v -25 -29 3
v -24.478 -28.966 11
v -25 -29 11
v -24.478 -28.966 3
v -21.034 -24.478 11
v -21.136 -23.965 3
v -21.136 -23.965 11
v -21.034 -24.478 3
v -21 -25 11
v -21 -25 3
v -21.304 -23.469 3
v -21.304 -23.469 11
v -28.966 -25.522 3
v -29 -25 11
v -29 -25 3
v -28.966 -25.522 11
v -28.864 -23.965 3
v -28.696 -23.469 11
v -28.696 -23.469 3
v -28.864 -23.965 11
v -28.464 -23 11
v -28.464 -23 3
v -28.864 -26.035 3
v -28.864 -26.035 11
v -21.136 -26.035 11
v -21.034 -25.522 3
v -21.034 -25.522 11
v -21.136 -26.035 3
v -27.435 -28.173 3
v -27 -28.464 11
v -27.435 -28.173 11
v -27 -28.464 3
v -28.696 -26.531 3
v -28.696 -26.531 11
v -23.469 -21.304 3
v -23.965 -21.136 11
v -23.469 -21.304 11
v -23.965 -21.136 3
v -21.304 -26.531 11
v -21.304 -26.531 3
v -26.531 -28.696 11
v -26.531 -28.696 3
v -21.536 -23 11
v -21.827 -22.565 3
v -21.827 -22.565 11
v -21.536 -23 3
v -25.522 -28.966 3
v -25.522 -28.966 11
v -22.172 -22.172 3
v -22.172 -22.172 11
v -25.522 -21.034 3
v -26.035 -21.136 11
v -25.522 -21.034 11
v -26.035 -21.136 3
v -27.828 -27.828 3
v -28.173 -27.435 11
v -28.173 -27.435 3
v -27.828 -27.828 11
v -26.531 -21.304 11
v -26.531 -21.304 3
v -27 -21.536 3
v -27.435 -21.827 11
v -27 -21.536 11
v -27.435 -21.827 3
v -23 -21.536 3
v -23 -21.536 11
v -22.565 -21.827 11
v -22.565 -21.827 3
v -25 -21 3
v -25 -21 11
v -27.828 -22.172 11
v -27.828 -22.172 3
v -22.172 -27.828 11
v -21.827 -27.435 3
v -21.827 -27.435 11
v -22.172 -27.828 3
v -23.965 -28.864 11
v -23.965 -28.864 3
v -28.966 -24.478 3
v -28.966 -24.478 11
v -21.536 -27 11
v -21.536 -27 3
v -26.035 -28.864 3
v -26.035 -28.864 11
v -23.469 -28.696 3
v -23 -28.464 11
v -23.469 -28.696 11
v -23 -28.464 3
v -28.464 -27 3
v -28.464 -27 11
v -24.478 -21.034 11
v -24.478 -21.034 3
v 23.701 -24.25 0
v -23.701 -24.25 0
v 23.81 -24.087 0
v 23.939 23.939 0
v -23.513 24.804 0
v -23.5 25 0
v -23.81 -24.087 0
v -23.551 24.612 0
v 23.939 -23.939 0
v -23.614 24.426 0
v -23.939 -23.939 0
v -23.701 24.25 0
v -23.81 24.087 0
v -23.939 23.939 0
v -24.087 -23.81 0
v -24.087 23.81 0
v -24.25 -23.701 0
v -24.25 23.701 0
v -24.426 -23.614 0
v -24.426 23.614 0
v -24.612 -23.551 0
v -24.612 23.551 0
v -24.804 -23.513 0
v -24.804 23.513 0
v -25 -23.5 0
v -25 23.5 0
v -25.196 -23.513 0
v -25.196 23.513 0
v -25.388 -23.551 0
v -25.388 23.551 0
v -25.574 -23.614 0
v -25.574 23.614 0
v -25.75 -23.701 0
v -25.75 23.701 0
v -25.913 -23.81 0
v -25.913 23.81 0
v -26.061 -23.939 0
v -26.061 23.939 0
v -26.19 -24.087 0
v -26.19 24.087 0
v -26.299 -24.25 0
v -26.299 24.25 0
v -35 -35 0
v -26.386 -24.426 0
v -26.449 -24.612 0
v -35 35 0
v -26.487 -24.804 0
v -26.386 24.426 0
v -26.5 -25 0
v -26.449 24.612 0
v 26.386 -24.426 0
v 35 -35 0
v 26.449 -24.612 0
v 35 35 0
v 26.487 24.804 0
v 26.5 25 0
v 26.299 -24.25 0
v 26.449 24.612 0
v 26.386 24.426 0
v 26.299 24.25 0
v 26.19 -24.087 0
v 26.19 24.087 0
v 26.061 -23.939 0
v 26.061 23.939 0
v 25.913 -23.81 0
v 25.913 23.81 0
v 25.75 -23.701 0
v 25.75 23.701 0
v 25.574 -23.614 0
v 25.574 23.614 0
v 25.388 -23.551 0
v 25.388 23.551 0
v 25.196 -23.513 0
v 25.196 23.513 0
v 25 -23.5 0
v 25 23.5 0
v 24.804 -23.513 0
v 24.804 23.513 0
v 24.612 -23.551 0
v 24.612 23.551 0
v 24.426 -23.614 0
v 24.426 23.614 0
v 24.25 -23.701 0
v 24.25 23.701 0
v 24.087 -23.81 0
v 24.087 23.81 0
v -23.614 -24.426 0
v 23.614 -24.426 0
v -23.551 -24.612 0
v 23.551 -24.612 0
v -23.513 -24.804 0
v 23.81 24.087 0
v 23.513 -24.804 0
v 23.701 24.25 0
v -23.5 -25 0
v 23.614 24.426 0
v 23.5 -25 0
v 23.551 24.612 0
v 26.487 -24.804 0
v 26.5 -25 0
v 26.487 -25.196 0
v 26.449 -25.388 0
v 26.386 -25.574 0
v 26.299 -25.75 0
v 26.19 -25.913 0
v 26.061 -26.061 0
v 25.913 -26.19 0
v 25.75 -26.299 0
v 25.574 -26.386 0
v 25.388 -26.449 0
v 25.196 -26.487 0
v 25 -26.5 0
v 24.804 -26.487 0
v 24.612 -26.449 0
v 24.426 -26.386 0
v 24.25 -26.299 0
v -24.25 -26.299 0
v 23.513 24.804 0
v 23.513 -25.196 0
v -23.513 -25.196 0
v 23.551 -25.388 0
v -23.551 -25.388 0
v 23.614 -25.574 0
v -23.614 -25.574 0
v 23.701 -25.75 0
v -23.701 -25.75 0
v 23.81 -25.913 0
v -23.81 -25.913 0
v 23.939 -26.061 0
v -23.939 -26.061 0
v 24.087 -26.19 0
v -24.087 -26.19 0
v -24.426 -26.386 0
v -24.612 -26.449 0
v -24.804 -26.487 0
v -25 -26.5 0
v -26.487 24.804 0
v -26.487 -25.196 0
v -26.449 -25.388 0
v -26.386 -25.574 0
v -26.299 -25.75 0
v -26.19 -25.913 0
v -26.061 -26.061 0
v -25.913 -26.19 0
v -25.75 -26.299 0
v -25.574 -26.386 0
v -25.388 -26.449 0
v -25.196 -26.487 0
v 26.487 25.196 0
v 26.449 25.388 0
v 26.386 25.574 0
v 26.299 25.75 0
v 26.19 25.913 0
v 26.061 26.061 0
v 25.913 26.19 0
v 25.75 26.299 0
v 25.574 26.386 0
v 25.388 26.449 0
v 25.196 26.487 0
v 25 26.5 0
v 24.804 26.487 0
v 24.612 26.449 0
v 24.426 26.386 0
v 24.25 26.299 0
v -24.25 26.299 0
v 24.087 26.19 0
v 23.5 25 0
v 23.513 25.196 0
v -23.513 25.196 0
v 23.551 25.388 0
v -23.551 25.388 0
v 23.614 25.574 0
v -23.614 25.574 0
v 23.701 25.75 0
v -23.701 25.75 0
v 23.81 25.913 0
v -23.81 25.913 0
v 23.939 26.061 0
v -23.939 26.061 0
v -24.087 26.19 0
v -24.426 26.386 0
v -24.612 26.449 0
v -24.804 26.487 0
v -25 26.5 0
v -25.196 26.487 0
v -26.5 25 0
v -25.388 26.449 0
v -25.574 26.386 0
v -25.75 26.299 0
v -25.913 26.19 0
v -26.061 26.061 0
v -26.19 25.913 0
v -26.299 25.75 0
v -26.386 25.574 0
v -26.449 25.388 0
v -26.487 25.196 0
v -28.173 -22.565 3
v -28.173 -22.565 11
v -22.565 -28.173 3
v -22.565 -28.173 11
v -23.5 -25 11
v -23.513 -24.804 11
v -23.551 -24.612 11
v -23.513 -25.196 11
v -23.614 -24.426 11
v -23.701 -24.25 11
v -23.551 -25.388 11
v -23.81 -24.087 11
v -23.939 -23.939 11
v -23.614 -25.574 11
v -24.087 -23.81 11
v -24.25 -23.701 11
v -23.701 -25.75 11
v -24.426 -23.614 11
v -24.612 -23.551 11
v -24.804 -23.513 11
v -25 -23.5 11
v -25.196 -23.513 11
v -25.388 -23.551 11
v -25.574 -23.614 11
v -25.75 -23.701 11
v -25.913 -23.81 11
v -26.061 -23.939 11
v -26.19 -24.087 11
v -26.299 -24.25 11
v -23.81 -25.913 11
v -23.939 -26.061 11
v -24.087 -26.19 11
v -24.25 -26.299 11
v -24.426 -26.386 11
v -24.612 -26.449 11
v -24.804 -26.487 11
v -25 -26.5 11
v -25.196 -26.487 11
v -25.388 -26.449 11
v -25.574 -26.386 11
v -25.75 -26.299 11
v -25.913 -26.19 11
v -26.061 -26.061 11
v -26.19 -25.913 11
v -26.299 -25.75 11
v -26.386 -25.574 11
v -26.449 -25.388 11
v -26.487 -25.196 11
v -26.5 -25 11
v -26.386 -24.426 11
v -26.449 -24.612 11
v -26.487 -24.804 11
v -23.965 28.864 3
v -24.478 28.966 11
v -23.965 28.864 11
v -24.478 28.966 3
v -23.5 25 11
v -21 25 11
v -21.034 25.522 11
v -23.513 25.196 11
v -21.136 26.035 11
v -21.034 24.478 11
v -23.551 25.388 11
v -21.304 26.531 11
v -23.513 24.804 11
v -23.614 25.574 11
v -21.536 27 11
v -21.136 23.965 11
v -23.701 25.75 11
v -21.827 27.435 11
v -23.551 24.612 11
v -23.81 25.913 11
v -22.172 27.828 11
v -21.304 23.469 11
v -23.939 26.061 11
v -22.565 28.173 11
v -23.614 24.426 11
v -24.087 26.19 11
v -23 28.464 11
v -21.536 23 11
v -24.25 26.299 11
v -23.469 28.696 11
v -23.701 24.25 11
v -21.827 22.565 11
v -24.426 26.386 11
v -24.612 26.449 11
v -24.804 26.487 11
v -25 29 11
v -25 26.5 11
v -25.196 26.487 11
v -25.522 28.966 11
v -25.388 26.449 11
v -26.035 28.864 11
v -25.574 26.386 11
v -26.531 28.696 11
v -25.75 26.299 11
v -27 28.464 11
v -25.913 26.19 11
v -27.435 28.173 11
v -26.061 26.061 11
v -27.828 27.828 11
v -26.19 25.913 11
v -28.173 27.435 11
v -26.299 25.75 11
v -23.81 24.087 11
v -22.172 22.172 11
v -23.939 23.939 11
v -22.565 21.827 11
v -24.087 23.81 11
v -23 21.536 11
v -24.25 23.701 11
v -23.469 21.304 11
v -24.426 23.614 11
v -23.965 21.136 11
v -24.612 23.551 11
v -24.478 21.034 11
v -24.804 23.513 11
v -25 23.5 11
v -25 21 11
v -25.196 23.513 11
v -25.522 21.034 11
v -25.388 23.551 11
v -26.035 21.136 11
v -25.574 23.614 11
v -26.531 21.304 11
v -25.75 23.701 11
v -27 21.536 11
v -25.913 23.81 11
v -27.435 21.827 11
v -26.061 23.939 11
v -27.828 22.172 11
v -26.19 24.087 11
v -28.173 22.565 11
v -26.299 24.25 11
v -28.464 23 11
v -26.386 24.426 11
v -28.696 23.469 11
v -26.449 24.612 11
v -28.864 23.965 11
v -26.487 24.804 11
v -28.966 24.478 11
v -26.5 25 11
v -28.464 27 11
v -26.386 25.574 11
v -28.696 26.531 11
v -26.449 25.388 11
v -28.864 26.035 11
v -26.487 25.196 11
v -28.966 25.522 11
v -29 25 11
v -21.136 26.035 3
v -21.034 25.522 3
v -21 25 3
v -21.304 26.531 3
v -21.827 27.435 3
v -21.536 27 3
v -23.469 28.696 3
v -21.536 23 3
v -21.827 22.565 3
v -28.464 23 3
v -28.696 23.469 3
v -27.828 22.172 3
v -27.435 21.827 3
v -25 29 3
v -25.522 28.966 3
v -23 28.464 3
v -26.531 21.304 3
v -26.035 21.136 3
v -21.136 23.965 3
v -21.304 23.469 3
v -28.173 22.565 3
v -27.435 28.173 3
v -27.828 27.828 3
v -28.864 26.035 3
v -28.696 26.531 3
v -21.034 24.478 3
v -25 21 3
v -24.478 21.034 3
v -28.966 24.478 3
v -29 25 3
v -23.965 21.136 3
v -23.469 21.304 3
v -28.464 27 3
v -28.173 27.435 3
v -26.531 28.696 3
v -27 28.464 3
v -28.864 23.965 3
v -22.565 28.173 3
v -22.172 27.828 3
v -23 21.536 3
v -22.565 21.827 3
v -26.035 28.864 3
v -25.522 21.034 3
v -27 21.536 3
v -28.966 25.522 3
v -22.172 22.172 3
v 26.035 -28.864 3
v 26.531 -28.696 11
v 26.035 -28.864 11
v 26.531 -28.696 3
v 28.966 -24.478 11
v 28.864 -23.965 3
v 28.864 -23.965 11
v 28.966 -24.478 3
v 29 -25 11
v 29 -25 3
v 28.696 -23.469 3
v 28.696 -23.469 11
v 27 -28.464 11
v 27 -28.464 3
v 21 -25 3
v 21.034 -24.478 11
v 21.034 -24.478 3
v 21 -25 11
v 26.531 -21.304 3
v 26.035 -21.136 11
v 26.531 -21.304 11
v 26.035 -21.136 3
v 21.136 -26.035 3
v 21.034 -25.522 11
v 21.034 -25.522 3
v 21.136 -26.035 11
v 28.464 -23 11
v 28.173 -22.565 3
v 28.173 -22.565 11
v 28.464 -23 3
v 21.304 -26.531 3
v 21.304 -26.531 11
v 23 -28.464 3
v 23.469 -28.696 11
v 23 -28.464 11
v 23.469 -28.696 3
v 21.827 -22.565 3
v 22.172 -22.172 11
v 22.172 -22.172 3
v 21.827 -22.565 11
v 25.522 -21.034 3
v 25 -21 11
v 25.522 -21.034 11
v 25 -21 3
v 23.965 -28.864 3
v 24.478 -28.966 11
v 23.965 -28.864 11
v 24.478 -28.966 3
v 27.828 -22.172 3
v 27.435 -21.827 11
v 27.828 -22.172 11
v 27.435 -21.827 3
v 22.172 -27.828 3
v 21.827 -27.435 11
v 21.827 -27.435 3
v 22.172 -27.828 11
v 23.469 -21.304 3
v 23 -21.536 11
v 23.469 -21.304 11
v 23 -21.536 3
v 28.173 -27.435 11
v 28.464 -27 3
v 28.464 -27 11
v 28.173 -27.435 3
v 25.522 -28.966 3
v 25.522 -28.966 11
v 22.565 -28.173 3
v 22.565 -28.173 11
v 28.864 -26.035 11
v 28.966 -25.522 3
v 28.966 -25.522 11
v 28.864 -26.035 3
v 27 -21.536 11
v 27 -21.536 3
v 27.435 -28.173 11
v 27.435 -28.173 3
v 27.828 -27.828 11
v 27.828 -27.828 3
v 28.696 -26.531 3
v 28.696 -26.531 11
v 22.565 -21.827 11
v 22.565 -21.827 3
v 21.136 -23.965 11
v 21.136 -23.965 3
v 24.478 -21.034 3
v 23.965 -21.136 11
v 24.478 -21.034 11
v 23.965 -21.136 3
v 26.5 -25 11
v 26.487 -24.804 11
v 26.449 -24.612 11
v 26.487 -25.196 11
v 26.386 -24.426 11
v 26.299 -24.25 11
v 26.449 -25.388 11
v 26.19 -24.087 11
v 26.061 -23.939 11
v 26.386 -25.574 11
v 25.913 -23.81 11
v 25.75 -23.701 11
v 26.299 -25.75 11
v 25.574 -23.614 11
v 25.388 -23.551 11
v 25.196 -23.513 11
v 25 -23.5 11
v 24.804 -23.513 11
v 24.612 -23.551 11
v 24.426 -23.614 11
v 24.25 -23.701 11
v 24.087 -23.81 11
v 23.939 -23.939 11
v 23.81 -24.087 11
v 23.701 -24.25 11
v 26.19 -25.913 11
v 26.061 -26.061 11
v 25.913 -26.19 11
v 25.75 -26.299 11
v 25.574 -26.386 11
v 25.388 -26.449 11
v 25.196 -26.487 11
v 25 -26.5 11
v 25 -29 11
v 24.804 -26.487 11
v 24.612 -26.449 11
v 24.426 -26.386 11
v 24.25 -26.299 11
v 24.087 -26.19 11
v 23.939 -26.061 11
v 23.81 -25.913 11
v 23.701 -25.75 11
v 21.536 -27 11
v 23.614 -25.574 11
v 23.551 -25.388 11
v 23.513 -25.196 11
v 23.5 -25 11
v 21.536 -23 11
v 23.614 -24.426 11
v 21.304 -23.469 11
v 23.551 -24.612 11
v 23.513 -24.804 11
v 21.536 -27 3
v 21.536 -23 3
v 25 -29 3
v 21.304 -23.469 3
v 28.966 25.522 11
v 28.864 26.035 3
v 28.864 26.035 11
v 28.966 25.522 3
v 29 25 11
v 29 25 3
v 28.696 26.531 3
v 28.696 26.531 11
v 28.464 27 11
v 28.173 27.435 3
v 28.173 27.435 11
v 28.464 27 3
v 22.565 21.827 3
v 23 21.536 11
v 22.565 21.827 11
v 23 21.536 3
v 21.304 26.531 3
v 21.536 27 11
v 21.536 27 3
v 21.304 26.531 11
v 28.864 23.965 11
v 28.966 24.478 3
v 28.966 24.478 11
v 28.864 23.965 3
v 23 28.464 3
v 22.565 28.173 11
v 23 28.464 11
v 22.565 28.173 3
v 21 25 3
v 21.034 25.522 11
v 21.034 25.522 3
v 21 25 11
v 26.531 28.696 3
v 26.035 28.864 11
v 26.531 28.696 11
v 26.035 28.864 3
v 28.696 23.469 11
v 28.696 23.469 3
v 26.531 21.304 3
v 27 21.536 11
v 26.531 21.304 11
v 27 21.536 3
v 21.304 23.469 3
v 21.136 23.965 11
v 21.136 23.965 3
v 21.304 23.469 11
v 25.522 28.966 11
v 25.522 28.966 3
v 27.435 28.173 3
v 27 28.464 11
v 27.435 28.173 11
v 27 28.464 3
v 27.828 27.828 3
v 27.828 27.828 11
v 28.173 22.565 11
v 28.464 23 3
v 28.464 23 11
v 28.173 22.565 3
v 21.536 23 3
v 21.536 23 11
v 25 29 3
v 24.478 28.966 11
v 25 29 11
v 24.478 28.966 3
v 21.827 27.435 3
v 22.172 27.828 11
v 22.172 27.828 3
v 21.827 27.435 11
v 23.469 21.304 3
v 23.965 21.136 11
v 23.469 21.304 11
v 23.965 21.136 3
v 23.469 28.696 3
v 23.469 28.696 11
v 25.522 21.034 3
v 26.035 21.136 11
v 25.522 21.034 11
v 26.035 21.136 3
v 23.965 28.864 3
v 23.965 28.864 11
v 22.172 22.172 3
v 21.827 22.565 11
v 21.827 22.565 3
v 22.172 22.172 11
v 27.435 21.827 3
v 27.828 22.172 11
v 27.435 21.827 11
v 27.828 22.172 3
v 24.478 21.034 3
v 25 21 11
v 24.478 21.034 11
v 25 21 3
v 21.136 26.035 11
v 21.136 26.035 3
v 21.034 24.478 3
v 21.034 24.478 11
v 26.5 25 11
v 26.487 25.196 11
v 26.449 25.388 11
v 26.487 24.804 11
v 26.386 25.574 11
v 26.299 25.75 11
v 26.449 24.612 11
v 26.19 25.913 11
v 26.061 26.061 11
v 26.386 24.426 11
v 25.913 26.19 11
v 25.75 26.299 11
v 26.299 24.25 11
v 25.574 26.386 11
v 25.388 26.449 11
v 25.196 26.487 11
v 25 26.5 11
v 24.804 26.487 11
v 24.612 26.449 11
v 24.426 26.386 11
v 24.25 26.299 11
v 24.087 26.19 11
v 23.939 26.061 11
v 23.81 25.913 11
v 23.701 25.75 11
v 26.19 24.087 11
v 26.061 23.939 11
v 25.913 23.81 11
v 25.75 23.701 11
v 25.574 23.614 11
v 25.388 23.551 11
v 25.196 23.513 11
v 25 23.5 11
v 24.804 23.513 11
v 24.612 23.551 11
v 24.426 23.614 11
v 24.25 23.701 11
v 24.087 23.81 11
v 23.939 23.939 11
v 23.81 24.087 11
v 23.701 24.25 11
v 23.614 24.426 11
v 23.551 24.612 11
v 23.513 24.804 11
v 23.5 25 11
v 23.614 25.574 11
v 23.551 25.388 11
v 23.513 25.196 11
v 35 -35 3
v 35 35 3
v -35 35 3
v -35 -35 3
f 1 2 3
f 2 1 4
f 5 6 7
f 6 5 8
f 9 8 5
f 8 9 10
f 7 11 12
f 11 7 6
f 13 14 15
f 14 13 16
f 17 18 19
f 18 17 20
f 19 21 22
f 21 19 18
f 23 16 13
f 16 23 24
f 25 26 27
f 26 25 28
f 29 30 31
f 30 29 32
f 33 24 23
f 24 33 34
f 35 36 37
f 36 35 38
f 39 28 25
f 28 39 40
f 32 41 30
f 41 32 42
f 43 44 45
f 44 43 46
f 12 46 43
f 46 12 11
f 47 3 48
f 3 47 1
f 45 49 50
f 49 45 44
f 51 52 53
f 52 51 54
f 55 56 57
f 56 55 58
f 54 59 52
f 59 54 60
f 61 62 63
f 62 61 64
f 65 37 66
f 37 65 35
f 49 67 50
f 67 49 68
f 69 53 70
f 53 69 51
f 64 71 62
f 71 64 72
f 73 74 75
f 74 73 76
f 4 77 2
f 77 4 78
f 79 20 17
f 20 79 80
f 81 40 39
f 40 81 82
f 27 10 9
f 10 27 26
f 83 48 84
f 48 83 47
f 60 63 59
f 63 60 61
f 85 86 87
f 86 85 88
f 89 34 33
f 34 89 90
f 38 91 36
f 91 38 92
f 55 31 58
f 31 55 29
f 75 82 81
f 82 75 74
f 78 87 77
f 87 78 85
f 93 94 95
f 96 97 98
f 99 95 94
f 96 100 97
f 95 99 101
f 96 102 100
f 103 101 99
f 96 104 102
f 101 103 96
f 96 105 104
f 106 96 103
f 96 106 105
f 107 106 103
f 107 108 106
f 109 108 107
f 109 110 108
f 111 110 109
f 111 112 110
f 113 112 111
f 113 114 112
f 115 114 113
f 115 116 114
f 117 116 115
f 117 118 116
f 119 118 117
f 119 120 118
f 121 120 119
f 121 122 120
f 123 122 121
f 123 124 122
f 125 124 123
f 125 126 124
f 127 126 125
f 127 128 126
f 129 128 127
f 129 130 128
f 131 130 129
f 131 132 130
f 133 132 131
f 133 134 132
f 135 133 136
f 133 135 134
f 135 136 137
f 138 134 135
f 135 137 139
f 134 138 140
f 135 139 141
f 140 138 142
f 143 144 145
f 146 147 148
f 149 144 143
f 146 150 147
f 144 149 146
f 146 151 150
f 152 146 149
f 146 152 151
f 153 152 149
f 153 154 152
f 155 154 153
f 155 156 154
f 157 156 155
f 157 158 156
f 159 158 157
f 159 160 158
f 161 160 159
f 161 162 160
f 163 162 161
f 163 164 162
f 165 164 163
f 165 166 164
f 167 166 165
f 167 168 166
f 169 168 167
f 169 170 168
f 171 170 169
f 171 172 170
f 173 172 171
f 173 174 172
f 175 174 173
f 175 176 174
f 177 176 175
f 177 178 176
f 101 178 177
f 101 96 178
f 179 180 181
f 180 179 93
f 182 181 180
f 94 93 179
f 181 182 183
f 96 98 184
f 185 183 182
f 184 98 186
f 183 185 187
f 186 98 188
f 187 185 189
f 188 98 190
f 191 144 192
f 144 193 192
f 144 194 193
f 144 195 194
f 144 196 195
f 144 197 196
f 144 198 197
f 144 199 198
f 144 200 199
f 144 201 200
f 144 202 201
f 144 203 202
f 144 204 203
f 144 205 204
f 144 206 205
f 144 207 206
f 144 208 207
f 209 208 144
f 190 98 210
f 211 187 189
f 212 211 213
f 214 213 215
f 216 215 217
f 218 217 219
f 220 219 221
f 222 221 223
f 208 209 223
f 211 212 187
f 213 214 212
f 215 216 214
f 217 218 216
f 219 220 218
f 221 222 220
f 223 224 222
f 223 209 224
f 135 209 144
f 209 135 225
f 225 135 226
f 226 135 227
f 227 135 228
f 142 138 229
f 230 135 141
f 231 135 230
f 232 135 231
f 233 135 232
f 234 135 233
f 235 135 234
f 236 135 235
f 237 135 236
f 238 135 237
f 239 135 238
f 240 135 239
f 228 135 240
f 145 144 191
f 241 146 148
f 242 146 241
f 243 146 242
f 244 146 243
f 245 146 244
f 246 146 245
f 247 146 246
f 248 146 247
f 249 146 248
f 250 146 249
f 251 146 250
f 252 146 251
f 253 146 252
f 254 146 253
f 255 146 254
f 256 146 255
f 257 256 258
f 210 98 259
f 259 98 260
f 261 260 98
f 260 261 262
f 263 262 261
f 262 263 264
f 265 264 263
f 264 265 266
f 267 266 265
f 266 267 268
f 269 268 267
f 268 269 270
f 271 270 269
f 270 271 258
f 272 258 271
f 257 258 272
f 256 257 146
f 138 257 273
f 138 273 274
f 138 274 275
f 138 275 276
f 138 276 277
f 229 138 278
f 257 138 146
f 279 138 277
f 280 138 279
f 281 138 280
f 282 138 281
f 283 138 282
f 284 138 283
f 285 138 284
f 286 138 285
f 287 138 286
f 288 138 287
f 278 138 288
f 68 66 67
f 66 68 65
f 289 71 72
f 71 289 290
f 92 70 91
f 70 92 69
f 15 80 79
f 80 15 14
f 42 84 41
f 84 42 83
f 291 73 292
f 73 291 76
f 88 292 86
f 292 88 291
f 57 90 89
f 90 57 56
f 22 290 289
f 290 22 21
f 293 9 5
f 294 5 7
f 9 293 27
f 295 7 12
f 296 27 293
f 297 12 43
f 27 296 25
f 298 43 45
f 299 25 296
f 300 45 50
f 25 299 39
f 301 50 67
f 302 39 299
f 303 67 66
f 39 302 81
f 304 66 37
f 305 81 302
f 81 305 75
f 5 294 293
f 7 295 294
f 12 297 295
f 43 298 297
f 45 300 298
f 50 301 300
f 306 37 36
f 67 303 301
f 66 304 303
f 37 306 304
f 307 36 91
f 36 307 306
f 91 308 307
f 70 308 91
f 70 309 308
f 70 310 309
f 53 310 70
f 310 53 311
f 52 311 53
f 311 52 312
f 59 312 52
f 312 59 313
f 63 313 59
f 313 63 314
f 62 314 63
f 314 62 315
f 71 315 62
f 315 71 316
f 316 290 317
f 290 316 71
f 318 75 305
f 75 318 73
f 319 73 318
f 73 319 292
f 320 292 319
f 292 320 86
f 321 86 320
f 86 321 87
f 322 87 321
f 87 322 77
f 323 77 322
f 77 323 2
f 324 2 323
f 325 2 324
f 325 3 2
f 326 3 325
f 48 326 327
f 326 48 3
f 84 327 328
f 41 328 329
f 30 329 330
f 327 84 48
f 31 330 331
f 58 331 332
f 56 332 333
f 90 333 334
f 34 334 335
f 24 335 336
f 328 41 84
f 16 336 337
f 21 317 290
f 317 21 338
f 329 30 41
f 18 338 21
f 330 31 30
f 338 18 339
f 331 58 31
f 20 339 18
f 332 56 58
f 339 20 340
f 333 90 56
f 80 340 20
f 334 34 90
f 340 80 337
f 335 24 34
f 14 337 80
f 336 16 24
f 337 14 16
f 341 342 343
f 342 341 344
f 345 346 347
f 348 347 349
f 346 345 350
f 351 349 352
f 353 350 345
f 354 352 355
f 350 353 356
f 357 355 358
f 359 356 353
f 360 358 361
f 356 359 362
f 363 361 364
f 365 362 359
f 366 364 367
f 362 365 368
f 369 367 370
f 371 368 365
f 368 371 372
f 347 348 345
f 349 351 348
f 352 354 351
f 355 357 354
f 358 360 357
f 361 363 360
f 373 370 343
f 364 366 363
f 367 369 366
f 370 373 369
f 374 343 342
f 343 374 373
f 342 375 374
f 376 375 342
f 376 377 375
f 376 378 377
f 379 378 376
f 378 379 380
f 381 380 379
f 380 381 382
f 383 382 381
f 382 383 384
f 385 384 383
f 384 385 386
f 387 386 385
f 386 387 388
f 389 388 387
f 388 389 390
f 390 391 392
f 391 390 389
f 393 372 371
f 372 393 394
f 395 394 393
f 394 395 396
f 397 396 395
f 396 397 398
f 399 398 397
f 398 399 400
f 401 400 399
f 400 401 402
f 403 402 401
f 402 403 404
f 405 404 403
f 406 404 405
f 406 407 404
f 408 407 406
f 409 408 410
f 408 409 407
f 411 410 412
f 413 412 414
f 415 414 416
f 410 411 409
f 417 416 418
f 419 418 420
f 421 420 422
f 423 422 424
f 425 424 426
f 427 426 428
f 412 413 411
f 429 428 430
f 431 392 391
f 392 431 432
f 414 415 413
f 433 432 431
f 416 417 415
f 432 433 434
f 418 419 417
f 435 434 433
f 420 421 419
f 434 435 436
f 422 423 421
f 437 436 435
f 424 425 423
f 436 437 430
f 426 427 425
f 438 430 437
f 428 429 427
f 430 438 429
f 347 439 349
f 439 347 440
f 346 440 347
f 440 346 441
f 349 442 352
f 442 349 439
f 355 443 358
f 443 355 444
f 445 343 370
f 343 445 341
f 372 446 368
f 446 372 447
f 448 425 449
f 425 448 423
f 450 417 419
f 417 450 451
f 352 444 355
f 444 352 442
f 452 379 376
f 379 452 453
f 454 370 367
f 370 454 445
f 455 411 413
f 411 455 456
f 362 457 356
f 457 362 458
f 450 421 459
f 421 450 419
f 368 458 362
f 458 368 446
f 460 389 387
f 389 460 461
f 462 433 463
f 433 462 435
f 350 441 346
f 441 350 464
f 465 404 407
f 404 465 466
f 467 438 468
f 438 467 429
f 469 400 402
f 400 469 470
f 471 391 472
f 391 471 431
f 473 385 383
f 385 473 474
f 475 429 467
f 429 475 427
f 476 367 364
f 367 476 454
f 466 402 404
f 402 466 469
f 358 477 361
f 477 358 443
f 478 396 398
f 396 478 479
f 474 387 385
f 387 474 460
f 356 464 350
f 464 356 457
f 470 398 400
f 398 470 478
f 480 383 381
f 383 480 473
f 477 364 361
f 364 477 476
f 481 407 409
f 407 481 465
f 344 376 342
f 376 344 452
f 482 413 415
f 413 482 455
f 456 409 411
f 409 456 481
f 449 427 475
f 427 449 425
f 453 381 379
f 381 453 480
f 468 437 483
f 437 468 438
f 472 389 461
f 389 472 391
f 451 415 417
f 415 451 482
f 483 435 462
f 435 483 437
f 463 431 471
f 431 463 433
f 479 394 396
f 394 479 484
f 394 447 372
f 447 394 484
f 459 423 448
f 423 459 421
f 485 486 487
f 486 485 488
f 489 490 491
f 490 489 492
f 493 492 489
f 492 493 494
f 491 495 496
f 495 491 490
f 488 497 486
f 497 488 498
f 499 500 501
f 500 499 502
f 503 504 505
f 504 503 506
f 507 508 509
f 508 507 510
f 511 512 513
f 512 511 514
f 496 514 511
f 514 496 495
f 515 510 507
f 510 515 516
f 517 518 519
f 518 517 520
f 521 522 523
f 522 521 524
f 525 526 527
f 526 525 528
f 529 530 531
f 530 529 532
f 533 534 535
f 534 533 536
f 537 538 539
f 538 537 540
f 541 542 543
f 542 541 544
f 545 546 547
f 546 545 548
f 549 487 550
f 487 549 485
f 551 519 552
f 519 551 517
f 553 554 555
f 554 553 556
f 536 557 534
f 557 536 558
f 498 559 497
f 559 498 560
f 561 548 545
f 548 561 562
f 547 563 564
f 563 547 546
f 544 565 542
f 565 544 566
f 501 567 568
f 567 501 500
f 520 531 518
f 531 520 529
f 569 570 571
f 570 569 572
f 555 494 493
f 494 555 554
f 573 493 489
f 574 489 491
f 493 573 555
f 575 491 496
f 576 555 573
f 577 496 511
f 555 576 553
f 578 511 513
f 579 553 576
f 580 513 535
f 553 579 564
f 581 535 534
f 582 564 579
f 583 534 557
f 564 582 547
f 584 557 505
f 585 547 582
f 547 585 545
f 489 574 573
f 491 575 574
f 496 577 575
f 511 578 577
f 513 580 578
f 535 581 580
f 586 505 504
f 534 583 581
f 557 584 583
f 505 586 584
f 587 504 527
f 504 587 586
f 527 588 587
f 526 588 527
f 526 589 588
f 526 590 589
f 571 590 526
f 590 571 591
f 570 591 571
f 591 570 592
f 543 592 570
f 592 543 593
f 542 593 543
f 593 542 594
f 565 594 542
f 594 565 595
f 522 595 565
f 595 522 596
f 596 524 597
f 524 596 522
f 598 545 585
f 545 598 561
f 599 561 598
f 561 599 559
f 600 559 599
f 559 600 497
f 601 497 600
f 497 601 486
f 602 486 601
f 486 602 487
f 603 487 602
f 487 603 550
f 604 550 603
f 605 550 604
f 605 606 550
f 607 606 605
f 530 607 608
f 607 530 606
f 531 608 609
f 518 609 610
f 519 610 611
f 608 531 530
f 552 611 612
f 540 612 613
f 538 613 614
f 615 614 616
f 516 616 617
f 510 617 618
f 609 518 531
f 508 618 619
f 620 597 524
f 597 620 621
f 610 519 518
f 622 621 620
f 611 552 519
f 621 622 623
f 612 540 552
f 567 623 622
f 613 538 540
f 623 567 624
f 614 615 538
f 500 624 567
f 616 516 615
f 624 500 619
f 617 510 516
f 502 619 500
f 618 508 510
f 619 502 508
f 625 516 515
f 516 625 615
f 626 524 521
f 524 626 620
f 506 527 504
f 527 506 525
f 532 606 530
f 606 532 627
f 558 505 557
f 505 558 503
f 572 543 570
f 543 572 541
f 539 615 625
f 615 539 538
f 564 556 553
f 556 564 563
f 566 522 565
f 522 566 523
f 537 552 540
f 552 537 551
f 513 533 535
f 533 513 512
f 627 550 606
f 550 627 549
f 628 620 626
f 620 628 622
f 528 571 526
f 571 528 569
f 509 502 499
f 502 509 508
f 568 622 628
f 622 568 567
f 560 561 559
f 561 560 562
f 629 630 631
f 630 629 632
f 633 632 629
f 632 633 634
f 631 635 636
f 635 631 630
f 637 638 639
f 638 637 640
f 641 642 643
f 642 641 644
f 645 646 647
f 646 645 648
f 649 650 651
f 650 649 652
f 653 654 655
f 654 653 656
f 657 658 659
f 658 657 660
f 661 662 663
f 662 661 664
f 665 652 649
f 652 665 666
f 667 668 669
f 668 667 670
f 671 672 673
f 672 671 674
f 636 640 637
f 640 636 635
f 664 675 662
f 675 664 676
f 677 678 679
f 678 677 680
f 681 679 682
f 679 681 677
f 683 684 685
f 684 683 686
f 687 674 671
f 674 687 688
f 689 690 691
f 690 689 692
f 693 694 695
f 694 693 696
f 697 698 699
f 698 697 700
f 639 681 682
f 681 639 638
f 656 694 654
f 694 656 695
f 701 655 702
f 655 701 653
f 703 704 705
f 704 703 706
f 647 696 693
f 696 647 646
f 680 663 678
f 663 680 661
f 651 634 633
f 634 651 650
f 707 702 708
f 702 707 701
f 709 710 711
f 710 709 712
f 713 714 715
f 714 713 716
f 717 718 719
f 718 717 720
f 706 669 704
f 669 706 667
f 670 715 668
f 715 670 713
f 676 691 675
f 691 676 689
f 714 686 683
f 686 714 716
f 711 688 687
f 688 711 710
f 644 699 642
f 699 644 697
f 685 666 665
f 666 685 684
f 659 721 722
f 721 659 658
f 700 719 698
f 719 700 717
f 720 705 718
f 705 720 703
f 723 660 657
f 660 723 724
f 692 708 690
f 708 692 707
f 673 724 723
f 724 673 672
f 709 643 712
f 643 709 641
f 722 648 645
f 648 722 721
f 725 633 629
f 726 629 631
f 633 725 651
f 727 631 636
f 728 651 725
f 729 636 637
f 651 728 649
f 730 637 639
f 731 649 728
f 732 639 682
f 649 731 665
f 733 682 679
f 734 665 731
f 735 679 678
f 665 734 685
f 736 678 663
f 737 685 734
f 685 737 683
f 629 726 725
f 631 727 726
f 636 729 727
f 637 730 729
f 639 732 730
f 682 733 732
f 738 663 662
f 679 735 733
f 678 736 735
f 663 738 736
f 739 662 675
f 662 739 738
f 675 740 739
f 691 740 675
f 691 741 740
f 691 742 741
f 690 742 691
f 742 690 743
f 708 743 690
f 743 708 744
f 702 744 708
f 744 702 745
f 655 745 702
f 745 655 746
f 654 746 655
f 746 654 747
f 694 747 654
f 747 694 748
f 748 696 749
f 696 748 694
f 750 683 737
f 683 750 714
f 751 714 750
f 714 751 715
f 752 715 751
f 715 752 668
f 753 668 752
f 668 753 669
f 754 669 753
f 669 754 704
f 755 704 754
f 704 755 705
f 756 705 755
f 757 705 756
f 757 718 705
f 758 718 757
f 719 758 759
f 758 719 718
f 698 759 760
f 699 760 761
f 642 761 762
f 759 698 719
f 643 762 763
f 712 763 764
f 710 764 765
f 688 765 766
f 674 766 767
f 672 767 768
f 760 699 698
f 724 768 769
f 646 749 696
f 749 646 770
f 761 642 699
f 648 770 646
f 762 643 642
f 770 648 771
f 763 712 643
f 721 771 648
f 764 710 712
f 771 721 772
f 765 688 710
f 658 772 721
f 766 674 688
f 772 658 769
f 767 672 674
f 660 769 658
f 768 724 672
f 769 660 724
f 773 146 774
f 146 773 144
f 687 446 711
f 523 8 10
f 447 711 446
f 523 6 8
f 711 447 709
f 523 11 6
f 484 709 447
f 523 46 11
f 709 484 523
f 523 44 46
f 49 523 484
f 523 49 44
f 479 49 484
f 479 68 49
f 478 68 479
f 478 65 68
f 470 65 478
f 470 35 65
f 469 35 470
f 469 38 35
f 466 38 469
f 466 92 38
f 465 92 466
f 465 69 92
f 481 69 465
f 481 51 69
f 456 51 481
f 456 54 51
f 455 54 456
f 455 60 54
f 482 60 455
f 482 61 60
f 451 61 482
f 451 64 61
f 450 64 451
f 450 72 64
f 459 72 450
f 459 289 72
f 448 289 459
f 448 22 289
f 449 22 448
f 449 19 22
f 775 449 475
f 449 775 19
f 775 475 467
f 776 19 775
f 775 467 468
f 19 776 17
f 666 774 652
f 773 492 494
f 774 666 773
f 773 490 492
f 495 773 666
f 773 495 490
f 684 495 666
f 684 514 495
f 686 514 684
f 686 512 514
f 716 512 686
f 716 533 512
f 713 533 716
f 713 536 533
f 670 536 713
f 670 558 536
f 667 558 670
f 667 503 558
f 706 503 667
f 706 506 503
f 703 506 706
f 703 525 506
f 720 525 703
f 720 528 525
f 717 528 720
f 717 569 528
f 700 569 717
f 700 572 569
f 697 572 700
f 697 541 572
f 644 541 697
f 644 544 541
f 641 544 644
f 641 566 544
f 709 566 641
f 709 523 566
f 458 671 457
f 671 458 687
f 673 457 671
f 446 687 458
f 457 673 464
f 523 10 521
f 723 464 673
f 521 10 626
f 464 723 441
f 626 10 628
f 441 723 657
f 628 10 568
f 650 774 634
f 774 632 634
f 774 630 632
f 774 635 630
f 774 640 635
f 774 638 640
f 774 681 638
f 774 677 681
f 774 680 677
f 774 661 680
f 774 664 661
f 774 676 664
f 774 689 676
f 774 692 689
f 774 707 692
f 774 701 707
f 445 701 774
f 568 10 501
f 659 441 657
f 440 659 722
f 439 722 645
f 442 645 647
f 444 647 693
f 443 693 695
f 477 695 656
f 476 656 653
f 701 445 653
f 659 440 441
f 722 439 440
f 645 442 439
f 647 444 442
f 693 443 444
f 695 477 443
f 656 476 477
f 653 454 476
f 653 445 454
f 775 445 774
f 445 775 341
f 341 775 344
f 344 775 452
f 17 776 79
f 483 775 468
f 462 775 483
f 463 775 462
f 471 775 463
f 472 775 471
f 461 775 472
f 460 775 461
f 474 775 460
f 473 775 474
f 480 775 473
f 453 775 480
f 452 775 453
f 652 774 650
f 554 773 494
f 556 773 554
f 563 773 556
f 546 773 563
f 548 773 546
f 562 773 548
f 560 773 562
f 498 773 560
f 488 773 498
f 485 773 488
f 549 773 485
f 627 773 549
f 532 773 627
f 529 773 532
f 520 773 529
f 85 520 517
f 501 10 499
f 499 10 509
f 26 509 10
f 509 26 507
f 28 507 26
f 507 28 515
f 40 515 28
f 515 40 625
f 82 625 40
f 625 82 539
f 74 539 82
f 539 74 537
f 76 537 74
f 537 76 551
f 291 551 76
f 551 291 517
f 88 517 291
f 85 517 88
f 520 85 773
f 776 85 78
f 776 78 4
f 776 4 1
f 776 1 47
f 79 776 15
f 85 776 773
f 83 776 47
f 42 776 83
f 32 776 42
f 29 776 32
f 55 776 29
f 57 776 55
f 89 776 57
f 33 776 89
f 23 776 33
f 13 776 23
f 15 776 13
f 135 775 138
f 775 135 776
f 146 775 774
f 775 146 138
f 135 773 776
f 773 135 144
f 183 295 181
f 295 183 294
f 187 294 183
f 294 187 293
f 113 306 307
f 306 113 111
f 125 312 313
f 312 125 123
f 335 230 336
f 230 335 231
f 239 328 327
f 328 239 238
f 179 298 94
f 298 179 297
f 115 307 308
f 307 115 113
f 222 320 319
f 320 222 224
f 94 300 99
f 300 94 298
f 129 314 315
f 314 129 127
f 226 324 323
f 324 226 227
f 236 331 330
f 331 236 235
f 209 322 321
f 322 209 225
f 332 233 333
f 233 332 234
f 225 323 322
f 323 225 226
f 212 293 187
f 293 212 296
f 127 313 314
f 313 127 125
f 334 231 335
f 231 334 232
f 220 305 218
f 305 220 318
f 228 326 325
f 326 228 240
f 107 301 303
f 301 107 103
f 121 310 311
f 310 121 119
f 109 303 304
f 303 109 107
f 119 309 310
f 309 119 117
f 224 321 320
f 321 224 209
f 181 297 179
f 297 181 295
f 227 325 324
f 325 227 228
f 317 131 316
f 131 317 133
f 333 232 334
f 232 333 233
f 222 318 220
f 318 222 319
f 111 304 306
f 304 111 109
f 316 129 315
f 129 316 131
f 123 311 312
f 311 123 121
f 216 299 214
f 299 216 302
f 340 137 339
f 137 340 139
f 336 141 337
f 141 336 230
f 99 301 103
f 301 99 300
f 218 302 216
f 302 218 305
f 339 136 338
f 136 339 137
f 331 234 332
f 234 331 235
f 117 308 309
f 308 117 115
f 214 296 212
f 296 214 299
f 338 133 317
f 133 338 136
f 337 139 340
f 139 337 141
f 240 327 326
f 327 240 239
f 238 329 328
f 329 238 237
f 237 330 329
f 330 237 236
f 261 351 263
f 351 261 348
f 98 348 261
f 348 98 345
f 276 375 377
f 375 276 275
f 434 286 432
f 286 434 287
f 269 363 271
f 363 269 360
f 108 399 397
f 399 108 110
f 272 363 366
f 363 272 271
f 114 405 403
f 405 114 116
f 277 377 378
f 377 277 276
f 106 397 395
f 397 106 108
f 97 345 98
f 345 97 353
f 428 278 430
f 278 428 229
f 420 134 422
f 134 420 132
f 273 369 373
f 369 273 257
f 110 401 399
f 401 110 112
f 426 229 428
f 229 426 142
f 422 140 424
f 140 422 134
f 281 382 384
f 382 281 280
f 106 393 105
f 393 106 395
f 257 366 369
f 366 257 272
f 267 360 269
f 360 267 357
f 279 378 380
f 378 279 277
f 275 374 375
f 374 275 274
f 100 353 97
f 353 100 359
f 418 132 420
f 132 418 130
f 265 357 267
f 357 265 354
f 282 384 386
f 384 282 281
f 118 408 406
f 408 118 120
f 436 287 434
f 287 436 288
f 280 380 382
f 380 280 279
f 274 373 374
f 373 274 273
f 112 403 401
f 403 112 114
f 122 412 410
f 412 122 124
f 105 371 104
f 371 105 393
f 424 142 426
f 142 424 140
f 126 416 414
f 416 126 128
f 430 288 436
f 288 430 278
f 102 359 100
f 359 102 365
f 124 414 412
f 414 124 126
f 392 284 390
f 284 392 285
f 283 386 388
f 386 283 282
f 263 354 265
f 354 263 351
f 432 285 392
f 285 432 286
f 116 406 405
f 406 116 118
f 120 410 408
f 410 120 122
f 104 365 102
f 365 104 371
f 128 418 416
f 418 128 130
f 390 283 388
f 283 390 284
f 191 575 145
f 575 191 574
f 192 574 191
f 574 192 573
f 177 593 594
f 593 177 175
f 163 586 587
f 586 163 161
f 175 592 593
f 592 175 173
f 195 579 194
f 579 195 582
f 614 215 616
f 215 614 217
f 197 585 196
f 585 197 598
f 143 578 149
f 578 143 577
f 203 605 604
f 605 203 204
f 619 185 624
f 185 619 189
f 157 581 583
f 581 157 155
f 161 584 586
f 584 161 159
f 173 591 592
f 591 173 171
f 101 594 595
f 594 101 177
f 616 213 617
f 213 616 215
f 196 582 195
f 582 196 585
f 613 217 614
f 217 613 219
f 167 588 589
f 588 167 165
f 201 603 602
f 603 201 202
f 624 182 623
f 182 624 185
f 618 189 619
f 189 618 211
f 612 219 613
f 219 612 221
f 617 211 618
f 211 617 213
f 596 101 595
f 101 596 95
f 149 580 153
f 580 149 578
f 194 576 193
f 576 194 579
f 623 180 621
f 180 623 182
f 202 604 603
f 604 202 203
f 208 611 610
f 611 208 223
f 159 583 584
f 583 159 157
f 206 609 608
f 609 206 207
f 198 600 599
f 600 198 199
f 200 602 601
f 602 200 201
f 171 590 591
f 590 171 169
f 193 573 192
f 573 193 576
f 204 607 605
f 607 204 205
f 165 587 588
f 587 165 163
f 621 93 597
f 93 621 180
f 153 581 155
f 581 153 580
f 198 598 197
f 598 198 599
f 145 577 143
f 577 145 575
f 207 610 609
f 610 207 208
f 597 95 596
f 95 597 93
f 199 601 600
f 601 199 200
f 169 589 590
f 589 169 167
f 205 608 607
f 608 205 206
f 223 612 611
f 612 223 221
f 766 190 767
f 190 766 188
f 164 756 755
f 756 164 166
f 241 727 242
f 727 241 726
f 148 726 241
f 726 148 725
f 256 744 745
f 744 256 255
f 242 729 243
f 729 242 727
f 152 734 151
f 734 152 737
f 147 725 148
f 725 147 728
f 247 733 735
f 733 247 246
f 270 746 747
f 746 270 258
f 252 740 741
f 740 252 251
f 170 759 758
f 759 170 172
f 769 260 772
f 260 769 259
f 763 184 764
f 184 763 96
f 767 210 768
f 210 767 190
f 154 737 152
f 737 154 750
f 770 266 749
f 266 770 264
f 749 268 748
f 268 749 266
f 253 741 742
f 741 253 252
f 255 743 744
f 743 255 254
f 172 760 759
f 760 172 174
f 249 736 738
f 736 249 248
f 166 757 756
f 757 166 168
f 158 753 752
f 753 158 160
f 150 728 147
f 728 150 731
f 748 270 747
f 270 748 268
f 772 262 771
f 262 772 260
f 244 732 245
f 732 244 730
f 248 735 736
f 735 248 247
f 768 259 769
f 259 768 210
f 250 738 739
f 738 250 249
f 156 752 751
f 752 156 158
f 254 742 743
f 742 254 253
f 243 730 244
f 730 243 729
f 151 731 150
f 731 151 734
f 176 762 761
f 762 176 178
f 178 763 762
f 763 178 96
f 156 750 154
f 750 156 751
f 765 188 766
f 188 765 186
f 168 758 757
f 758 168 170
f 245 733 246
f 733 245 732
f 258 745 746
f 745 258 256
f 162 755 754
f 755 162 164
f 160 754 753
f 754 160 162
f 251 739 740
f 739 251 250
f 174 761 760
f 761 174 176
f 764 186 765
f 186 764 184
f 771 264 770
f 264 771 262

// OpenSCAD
// PCB standoff plate - a base plate with four standoff bosses at a square pitch, each with a
// screw hole, to mount a board above a surface. NOVEL general part.
//
// @desc PCB standoff plate with four standoff bosses
// @prompt Design a PCB standoff plate in OpenSCAD: a {plate} mm square base with four standoff bosses {boss_h} mm tall at the corners of a {pitch} mm square, each with a {screw} mm screw hole. Reply with a single complete OpenSCAD file.
// @param plate  plate size (square), mm   [40:150]
// @param pitch  mounting hole pitch, mm   [25:120]
// @param boss_h standoff height, mm       [4:20]
// @param screw  screw hole diameter, mm   [2:6]

plate  = 70;
pitch  = 50;
boss_h = 8;
screw  = 3;

$fn = 48;

base_t = 3;
boss_d = screw + 5;

difference() {
    union() {
        translate([-plate / 2, -plate / 2, 0]) cube([plate, plate, base_t]);
        for (x = [-pitch / 2, pitch / 2])
            for (y = [-pitch / 2, pitch / 2])
                translate([x, y, 0]) cylinder(h = base_t + boss_h, d = boss_d);
    }
    for (x = [-pitch / 2, pitch / 2])
        for (y = [-pitch / 2, pitch / 2])
            translate([x, y, -1]) cylinder(h = base_t + boss_h + 2, d = screw);
}
